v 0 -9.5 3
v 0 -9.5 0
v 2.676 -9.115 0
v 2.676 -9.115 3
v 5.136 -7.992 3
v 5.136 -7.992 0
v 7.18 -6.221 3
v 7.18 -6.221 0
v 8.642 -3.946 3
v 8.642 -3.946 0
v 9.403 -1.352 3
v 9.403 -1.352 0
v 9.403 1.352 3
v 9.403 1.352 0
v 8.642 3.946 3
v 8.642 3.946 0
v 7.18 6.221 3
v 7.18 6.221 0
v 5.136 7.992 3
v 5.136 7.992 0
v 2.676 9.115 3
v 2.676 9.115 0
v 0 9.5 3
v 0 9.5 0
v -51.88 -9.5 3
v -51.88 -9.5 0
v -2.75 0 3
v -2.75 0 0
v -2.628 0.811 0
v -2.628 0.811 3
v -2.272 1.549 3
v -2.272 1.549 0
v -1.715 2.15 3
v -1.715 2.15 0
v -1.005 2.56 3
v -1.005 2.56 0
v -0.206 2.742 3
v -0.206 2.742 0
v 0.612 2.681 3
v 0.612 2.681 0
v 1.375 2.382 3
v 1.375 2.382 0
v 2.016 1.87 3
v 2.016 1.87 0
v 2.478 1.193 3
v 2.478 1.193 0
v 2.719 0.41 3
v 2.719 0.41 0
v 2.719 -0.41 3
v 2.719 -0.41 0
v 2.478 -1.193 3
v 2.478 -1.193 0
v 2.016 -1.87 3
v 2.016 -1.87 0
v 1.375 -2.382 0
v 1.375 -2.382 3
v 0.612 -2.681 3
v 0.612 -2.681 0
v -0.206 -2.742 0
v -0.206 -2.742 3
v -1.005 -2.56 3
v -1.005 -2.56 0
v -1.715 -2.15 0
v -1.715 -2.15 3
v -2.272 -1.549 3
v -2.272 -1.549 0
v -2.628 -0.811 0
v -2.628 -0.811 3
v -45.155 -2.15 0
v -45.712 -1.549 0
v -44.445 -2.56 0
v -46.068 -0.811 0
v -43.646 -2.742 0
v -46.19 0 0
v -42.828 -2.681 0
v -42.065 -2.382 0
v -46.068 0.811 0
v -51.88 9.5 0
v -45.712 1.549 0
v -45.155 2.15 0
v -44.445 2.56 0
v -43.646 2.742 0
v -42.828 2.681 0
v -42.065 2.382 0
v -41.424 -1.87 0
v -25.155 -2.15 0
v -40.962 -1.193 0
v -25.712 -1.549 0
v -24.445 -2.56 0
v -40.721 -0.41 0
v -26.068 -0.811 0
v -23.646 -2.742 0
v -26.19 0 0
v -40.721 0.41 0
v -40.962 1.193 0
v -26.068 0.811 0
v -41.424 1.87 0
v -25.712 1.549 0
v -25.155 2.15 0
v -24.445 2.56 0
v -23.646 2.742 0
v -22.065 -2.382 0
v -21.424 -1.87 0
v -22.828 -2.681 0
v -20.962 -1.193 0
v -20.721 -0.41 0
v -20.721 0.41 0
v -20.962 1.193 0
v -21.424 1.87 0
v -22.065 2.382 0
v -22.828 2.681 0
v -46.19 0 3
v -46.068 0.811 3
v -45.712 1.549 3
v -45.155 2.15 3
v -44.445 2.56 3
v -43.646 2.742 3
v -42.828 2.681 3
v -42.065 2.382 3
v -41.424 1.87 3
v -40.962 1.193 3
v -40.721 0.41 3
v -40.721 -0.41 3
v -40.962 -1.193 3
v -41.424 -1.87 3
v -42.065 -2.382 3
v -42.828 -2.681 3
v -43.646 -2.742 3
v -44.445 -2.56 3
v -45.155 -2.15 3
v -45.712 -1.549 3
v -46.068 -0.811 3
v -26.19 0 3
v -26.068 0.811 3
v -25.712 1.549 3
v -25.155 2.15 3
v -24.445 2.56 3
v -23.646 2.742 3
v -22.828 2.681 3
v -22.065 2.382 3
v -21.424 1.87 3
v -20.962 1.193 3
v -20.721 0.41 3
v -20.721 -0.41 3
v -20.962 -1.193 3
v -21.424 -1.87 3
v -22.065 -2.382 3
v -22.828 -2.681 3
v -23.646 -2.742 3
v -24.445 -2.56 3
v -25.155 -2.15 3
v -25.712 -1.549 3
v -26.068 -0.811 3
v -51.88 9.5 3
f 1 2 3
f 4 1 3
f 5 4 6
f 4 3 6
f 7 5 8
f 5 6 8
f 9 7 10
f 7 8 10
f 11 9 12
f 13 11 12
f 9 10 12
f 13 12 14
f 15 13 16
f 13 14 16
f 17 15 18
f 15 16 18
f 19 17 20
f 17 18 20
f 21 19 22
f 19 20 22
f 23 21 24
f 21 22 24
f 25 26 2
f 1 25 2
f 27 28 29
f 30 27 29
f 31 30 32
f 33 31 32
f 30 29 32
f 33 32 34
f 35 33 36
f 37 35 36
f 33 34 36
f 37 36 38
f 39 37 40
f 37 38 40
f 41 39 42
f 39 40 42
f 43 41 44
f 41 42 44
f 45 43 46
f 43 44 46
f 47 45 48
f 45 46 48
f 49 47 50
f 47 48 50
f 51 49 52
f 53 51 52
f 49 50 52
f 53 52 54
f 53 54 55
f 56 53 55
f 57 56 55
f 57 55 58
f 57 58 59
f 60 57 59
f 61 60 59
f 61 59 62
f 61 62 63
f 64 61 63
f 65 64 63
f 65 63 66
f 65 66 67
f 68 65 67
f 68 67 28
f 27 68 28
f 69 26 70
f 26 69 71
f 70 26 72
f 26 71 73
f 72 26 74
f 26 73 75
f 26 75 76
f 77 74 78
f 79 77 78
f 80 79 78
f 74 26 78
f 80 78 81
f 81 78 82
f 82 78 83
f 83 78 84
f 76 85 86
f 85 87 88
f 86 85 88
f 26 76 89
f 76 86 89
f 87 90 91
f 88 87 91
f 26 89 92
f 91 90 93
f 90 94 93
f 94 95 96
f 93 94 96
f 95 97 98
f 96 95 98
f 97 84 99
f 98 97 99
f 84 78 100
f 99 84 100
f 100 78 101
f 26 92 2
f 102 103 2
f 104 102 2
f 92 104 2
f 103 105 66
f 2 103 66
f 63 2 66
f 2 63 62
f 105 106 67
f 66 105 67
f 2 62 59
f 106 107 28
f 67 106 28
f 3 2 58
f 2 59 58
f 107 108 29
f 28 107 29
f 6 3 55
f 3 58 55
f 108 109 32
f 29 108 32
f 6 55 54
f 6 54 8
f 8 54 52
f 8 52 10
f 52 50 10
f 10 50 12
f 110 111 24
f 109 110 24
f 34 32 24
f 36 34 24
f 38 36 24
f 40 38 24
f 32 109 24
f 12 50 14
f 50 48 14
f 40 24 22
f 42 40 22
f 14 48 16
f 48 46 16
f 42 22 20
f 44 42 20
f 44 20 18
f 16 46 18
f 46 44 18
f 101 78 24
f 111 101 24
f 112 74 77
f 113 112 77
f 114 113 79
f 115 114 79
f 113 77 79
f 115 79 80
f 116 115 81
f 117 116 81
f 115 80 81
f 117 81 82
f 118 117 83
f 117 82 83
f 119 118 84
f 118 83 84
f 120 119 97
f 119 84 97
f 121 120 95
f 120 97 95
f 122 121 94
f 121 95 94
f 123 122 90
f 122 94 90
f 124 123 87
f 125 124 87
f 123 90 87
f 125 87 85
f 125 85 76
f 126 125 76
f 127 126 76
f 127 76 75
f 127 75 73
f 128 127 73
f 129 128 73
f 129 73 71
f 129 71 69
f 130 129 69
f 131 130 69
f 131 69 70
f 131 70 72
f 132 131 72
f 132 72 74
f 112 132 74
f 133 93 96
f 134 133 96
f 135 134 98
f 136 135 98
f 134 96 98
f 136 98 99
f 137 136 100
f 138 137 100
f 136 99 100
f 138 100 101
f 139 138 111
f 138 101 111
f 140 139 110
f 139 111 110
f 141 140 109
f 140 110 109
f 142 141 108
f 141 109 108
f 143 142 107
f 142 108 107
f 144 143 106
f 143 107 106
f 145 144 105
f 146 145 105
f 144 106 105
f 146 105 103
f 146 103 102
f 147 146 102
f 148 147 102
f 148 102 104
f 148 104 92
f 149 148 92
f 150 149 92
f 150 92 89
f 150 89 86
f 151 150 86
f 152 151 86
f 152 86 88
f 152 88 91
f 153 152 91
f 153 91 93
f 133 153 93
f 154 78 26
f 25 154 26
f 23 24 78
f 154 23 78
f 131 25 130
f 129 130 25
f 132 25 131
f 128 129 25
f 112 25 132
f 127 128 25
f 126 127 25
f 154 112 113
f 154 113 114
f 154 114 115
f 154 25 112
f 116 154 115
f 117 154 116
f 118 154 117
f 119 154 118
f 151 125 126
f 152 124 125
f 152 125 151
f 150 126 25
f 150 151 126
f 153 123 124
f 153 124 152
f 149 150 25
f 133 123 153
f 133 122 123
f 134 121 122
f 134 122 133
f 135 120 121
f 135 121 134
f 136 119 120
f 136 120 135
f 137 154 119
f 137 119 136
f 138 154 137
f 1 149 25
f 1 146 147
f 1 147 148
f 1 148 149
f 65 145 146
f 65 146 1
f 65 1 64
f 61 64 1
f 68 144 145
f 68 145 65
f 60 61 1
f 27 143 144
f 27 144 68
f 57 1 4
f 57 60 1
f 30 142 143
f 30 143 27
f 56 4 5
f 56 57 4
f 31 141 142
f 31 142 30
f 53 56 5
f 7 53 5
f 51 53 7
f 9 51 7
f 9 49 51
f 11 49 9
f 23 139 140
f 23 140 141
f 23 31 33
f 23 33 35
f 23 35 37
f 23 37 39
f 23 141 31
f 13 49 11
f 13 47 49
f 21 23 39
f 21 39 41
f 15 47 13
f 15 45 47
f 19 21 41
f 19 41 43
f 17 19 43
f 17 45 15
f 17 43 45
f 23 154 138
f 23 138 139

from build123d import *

# Parameters (mm, degrees)
BOSS_EXTRUDE1_DEPTH  = 3
M5_CLEARANCE_HOLE1_D = 5.5
M5_CLEARANCE_HOLE2_D = 5.5
M5_CLEARANCE_HOLE3_D = 5.5


with BuildPart() as part:
    # Sketch1 → Boss-Extrude1 (new body)
    with BuildSketch(Plane.XY):
        with BuildLine():
            Line((-51.88, -9.5), (0, -9.5))
            ThreePointArc((0, -9.5), (9.5, 0), (0, 9.5))
            Line((0, 9.5), (-51.88, 9.5))
            Line((-51.88, 9.5), (-51.88, -9.5))
        make_face()
    extrude(amount=BOSS_EXTRUDE1_DEPTH)

    # M5 Clearance Hole1 (through all)
    with Locations(Plane.XY.offset(3)):
        with Locations((-43.44, 0)):
            Hole(M5_CLEARANCE_HOLE1_D / 2)

    # M5 Clearance Hole2 (through all)
    with Locations(Plane.XY.offset(3)):
        with Locations((-23.44, 0)):
            Hole(M5_CLEARANCE_HOLE2_D / 2)

    # M5 Clearance Hole3 (through all)
    with Locations(Plane.XY.offset(3)):
        with Locations((0, 0)):
            Hole(M5_CLEARANCE_HOLE3_D / 2)


solid = part.part
